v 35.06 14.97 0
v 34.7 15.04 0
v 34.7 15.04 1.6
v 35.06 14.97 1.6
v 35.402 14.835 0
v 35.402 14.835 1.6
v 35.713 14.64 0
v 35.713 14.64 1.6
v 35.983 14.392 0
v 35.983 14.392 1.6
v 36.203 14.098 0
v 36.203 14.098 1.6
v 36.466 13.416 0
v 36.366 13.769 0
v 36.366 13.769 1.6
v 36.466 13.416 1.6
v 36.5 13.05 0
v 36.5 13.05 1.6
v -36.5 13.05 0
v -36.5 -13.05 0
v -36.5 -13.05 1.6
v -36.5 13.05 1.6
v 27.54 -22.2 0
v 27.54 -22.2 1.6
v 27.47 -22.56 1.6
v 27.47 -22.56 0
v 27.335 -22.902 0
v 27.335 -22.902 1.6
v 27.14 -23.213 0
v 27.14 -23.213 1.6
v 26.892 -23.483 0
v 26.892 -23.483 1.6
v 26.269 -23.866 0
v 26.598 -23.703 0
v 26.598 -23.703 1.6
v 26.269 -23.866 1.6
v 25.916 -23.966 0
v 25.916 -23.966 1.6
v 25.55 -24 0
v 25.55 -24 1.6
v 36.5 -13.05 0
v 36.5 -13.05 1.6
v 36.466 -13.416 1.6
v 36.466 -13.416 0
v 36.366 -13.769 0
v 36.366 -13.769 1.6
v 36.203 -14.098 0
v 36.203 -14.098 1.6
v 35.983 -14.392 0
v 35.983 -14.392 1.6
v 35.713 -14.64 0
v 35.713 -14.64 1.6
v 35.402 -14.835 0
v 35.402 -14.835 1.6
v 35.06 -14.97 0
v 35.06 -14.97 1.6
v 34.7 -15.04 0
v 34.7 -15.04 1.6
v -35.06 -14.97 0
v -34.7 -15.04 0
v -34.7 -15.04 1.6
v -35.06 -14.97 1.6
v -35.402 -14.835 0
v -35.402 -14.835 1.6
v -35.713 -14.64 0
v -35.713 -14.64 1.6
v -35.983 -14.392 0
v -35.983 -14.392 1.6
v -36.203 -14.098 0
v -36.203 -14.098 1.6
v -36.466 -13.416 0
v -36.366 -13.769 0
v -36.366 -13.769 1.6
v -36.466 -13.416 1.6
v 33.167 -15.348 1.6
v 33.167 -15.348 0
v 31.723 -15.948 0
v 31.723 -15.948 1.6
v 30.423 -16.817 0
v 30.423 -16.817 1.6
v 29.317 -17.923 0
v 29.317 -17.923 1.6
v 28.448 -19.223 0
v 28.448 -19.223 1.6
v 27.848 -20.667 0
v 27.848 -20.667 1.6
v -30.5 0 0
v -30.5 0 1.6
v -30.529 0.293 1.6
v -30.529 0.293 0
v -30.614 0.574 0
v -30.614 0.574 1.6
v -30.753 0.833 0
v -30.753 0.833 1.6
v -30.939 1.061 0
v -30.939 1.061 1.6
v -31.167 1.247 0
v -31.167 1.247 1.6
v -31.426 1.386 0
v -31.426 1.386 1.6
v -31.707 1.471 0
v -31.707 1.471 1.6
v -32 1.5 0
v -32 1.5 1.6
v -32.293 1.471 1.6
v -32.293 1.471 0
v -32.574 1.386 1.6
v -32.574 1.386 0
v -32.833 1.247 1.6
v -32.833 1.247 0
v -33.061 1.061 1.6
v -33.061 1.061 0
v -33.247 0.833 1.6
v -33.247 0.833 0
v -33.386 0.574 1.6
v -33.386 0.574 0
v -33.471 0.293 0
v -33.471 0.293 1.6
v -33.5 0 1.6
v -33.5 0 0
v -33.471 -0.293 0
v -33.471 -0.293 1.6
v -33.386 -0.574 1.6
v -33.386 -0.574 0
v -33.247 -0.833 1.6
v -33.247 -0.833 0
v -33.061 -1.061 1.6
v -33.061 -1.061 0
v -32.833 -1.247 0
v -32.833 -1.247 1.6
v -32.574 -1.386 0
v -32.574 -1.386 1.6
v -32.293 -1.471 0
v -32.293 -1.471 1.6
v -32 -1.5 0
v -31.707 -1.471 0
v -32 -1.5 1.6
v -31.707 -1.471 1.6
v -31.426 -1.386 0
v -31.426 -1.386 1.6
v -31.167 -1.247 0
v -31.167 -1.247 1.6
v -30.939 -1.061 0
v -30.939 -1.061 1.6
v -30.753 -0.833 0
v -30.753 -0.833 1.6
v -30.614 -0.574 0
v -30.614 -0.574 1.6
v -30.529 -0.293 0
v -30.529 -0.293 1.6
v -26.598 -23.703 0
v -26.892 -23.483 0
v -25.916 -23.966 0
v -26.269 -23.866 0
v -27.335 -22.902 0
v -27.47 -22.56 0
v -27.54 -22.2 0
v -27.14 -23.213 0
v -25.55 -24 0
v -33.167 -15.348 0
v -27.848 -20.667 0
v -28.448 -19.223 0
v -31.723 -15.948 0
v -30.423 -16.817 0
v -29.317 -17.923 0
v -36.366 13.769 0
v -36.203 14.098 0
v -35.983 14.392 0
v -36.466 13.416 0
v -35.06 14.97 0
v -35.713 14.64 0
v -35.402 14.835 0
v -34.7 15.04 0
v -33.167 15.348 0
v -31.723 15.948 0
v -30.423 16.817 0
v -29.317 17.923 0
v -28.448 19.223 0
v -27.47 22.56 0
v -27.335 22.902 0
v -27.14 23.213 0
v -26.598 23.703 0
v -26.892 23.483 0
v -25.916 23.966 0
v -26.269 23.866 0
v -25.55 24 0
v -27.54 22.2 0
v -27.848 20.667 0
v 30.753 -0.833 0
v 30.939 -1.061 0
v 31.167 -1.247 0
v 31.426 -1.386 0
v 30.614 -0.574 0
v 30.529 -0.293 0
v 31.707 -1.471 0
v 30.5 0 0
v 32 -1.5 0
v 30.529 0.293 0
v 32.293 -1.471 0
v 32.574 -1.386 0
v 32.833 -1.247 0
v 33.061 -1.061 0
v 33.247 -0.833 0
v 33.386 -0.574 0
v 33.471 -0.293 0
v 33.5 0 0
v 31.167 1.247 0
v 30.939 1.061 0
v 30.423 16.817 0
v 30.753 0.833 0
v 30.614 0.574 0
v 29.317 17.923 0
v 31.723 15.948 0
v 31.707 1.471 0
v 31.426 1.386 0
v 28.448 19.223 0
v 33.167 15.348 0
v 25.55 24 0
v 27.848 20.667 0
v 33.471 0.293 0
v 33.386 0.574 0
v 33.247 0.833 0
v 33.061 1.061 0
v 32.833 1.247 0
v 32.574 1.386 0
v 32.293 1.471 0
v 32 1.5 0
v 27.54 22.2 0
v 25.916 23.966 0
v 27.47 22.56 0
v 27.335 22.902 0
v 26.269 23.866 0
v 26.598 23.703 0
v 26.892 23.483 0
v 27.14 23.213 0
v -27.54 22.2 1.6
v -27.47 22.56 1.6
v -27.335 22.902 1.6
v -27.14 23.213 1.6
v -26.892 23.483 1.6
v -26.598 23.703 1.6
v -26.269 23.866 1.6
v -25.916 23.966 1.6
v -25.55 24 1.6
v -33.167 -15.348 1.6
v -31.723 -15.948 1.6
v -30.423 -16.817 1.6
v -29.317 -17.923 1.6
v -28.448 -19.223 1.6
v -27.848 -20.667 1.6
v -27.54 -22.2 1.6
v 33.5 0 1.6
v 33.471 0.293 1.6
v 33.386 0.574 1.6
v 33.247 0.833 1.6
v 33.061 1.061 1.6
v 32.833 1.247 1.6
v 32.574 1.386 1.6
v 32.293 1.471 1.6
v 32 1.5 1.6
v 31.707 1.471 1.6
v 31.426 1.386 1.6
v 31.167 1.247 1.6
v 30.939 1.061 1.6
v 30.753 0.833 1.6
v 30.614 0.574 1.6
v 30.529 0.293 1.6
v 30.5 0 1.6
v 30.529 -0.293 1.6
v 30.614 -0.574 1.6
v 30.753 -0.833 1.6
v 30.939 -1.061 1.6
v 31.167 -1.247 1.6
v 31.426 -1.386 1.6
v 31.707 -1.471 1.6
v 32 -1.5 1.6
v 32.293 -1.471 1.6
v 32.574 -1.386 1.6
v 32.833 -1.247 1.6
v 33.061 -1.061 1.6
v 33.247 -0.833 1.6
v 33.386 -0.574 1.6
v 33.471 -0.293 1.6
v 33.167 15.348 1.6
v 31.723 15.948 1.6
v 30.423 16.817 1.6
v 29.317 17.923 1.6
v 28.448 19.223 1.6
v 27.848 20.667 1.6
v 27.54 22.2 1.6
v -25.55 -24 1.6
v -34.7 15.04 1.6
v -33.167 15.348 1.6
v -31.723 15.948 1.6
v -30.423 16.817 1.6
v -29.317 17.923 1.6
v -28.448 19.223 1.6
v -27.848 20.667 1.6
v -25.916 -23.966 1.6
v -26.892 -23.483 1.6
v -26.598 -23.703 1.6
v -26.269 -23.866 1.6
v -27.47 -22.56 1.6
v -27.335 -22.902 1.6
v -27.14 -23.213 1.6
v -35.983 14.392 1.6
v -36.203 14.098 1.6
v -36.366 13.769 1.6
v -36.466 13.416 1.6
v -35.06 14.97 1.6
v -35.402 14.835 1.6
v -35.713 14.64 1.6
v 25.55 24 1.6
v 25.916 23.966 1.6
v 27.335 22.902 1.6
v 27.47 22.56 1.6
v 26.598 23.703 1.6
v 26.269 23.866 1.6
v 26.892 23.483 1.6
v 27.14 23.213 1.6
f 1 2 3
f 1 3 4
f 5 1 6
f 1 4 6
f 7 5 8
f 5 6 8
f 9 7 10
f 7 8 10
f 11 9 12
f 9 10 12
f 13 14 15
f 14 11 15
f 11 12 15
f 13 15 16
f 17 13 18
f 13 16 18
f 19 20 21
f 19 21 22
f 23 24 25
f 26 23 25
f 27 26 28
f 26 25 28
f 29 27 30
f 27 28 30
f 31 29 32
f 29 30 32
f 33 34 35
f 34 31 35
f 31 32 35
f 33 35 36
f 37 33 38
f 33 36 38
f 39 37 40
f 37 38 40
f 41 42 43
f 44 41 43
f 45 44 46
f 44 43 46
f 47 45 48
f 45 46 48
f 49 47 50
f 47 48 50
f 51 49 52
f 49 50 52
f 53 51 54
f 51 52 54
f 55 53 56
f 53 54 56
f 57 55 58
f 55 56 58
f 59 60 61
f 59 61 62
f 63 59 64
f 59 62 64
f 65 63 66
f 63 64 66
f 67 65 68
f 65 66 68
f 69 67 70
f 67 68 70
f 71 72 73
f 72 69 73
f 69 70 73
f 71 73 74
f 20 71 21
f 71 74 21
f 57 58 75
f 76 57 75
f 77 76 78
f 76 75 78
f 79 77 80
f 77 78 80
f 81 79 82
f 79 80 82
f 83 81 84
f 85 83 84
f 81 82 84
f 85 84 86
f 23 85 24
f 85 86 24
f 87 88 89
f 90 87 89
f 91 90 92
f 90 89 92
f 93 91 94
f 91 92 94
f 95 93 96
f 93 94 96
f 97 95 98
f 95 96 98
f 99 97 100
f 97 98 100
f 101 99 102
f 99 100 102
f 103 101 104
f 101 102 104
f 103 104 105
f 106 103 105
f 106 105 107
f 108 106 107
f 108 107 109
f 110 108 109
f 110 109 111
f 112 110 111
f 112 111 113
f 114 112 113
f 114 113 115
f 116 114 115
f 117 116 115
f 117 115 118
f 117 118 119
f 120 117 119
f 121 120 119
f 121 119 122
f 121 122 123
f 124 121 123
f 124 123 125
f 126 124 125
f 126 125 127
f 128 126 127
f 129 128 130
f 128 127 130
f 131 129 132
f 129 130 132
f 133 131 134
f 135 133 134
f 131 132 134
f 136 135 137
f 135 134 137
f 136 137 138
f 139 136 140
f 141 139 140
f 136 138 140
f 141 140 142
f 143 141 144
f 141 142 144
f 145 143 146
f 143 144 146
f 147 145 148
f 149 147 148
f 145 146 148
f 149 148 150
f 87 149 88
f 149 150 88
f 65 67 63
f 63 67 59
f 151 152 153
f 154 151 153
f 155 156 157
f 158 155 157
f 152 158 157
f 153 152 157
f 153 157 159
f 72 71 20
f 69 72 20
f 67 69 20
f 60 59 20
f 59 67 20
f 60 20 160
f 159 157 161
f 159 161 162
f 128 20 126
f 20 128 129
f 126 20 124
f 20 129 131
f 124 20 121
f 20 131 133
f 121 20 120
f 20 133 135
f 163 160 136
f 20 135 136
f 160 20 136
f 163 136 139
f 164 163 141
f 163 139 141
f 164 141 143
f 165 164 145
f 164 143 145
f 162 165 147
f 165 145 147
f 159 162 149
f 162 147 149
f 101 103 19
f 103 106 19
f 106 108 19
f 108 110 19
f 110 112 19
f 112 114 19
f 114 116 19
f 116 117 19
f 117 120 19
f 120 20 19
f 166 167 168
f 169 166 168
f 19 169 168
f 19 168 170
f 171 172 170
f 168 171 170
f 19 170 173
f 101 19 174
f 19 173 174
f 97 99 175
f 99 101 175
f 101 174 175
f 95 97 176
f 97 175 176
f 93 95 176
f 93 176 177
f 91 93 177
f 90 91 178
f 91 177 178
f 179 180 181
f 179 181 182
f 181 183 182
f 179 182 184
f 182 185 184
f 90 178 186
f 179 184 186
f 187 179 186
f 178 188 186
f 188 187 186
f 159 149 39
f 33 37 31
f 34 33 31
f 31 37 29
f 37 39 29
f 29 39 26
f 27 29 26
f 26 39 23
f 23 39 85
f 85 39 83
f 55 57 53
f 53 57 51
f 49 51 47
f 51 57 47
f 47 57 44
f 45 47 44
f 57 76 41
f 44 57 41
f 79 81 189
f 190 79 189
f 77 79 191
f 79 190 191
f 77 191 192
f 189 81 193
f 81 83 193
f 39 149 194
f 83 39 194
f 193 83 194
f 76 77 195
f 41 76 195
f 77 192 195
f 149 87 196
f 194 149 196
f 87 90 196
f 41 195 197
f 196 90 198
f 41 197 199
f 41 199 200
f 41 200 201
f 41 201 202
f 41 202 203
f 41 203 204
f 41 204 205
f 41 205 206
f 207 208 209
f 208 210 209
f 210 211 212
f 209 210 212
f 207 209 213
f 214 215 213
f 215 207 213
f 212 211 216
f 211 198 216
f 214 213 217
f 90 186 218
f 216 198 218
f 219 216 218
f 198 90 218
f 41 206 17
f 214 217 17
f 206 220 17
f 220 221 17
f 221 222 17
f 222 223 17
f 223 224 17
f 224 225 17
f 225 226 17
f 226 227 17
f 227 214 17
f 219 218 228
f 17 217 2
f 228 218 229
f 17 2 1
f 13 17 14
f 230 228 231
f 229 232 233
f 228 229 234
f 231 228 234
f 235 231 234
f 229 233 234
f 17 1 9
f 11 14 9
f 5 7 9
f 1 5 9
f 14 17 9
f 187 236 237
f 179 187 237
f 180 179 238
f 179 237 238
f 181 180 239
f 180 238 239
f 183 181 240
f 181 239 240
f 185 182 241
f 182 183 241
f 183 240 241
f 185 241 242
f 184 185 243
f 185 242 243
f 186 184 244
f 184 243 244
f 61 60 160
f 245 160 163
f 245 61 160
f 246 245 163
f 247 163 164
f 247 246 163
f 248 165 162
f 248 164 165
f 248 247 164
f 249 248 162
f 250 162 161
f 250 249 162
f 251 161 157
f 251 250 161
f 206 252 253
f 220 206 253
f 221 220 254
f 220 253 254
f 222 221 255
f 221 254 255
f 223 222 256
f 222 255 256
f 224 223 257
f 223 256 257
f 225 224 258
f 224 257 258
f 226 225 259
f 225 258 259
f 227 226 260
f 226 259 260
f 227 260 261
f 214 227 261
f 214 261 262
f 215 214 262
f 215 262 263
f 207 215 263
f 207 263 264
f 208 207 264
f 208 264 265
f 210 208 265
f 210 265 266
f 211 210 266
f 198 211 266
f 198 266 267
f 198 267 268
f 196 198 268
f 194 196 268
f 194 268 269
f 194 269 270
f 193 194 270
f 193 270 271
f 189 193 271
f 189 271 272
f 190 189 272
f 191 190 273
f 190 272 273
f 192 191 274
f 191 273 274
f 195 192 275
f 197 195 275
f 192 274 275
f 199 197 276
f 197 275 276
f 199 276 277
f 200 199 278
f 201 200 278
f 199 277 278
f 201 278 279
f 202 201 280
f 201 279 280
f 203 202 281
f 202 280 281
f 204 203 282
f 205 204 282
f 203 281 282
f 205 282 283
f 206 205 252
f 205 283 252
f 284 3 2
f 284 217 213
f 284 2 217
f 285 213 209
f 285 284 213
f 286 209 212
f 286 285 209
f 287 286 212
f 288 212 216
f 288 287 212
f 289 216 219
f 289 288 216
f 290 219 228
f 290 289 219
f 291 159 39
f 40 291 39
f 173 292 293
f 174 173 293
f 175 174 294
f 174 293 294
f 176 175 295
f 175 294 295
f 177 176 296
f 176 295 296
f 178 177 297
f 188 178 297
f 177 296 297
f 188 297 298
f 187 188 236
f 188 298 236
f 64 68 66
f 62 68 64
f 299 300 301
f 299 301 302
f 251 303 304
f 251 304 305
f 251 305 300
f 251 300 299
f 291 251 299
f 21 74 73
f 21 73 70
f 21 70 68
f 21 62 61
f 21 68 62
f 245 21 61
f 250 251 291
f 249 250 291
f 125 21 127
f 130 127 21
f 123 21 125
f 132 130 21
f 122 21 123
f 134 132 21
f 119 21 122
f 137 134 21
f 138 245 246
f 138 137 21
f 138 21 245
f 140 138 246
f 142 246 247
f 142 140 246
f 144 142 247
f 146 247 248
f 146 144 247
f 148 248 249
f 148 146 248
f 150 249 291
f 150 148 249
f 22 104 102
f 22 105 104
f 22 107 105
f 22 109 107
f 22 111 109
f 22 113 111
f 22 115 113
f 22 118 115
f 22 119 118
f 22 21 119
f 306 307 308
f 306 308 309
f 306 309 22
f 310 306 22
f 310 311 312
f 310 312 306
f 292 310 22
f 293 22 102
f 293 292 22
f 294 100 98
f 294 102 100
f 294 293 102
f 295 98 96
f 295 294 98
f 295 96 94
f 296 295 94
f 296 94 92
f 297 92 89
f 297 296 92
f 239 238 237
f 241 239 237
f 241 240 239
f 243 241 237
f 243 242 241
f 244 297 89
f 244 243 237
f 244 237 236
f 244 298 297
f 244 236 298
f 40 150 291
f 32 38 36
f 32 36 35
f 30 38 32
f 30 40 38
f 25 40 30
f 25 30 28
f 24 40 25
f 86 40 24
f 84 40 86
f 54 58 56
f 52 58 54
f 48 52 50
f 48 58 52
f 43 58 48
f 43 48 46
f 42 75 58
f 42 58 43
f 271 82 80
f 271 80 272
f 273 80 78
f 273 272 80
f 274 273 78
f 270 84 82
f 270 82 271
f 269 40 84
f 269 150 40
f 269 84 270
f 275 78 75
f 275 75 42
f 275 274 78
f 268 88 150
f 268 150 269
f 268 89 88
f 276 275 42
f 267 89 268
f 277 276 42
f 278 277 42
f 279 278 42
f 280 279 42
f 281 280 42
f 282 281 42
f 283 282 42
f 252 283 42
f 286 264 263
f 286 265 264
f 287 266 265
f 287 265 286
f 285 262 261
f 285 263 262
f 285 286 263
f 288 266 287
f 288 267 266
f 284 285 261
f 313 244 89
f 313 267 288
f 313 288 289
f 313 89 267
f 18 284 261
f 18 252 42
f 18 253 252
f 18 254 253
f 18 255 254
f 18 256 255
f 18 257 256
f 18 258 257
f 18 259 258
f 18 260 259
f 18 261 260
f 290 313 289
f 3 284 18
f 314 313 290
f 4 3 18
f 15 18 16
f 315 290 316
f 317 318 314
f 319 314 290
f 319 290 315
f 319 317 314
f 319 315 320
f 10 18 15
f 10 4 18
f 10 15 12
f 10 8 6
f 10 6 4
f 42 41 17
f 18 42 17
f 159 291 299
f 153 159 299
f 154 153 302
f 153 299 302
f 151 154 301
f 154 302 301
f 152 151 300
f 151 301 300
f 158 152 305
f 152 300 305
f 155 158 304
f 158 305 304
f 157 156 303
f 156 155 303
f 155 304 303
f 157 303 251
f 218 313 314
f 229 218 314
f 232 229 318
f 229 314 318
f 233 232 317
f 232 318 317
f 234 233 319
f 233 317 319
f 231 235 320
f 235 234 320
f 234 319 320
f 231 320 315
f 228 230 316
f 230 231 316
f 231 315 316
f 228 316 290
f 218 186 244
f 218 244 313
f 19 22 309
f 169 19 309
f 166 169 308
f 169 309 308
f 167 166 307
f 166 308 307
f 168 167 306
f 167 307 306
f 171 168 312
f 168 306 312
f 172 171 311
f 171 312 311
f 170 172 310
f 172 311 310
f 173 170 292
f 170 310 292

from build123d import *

# Parameters (mm, degrees)
SKETCH1_W                                = 73
SKETCH1_H                                = 48
BOSS_EXTRUDE1_DEPTH                      = 1.6
CUT_EXTRUDE1_DEPTH                       = 44.712812767
MIRROR1_AT_THE_SECOND_PLANE_COPY_1_DEPTH = 44.712812767
FILLET1_R                                = 2
SKETCH3_R                                = 1.5
CUT_EXTRUDE2_DEPTH                       = 44.712812767


with BuildPart() as part:
    # Sketch1 → Boss-Extrude1 (new body)
    with BuildSketch(Plane.XY):
        Rectangle(SKETCH1_W, SKETCH1_H)
    extrude(amount=BOSS_EXTRUDE1_DEPTH)

    # Sketch2 → Cut-Extrude1 (cut, through all)
    with BuildSketch(Plane.XY.offset(1.6)):
        with BuildLine():
            Line((-27.5, 23), (-27.5, 24))
            Line((-27.5, 24), (-36.5, 24))
            Line((-36.5, 24), (-36.5, 15))
            Line((-36.5, 15), (-35.5, 15))
            ThreePointArc((-35.5, 15), (-29.843145751, 17.343145751), (-27.5, 23))
        make_face()
    cut_extrude1 = extrude(amount=-CUT_EXTRUDE1_DEPTH, mode=Mode.SUBTRACT)

    # Mirror1: Cut-Extrude1 across plane
    add(cut_extrude1.mirror(Plane(origin=(0, 0, 0), x_dir=(0, 0, 1), z_dir=(1, 0, 0))), mode=Mode.SUBTRACT)

    # Mirror1 at the second plane: Cut-Extrude1 across plane
    add(cut_extrude1.mirror(Plane.ZX), mode=Mode.SUBTRACT)

    # Mirror1 at the second plane copy 1 sketc → Mirror1 at the second plane copy 1 (cut, through all)
    with BuildSketch(Plane(origin=(0, 0, 1.6), x_dir=(-1, 0, 0), z_dir=(0, 0, 1))):
        with BuildLine():
            Line((-27.5, 23), (-27.5, 24))
            Line((-27.5, 24), (-36.5, 24))
            Line((-36.5, 24), (-36.5, 15))
            Line((-36.5, 15), (-35.5, 15))
            ThreePointArc((-35.5, 15), (-29.843145751, 17.343145751), (-27.5, 23))
        make_face()
    extrude(amount=-MIRROR1_AT_THE_SECOND_PLANE_COPY_1_DEPTH, mode=Mode.SUBTRACT)

    # Fillet1
    # the kernel refuses this fillet: 2 mm, written as the material it takes off along each edge
    with BuildSketch(Plane(origin=(-36.5, 15, 6.474685928), x_dir=(0.9997519364152339, 0.022272530929157337, 0), z_dir=(0, 0, -1)), Plane(origin=(-27.5, -24, 6.474685928), x_dir=(-0.022272530929167148, 0.9997519364152335, 0), z_dir=(0, 0, -1)), Plane(origin=(36.5, -15, 6.474685928), x_dir=(-0.9997519364152339, -0.022272530929157337, 0), z_dir=(0, 0, -1))) as fillet1_piece_1:
        with BuildLine():
            CenterArc((1.956075236, 1.99393574), FILLET1_R, 181.276227552, 84.260829523)
            Line((-0.043428637, 1.949390678), (-0.243379025, 1.944936172))
            Line((-0.243379025, 1.944936172), (-0.199950387, -0.004454506))
            Line((-0.199950387, -0.004454506), (0.004454506, -0.199950387))
            ThreePointArc((0.004454506, -0.199950387), (1.004206443, -0.177677856), (1.784883764, -0.199393574))
            Line((1.784883764, -0.199393574), (1.800446625, 0))
        make_face()
    extrude(amount=11.349371855, mode=Mode.SUBTRACT)
    with BuildSketch(Plane(origin=(-27.5, 24, 6.474685928), x_dir=(1, 0, 0), z_dir=(0, 0, -1)), Plane(origin=(-36.5, -15, 6.474685928), x_dir=(0, 1, 0), z_dir=(0, 0, -1)), Plane(origin=(36.5, 15, 6.474685928), x_dir=(0, -1, 0), z_dir=(0, 0, -1)), Plane(origin=(27.5, -24, 6.474685928), x_dir=(-1, 0, 0), z_dir=(0, 0, -1))) as fillet1_piece_2:
        with BuildLine():
            CenterArc((1.949874371, 2), FILLET1_R, 185.739170477, 84.260829523)
            Line((-0.040100503, 1.8), (-0.239097991, 1.78))
            ThreePointArc((-0.239097991, 1.78), (-0.2, 1), (-0.2, 0))
            Line((-0.2, 0), (0, -0.2))
            Line((0, -0.2), (1.949874371, -0.2))
            Line((1.949874371, -0.2), (1.949874371, 0))
        make_face()
    extrude(amount=11.349371855, mode=Mode.SUBTRACT)
    with BuildSketch(Plane(origin=(27.5, 24, 6.474685928), x_dir=(-1, 0, 0), z_dir=(0, 0, -1))) as fillet1_piece_3:
        with BuildLine():
            CenterArc((1.949874371, -2), FILLET1_R, 90, 84.260829523)
            Line((-0.040100503, -1.8), (-0.239097991, -1.78))
            ThreePointArc((-0.239097991, -1.78), (-0.2, -1), (-0.2, 0))
            Line((-0.2, 0), (0, 0.2))
            Line((0, 0.2), (1.949874371, 0.2))
            Line((1.949874371, 0.2), (1.949874371, 0))
        make_face()
    extrude(amount=11.349371855, mode=Mode.SUBTRACT)

    # Sketch3 → Cut-Extrude2 (cut, through all)
    with BuildSketch(Plane.XY.offset(1.6)):
        with Locations((-32, 0)):
            Circle(SKETCH3_R)
        with Locations((32, 0)):
            Circle(SKETCH3_R)
    extrude(amount=-CUT_EXTRUDE2_DEPTH, mode=Mode.SUBTRACT)


solid = part.part
